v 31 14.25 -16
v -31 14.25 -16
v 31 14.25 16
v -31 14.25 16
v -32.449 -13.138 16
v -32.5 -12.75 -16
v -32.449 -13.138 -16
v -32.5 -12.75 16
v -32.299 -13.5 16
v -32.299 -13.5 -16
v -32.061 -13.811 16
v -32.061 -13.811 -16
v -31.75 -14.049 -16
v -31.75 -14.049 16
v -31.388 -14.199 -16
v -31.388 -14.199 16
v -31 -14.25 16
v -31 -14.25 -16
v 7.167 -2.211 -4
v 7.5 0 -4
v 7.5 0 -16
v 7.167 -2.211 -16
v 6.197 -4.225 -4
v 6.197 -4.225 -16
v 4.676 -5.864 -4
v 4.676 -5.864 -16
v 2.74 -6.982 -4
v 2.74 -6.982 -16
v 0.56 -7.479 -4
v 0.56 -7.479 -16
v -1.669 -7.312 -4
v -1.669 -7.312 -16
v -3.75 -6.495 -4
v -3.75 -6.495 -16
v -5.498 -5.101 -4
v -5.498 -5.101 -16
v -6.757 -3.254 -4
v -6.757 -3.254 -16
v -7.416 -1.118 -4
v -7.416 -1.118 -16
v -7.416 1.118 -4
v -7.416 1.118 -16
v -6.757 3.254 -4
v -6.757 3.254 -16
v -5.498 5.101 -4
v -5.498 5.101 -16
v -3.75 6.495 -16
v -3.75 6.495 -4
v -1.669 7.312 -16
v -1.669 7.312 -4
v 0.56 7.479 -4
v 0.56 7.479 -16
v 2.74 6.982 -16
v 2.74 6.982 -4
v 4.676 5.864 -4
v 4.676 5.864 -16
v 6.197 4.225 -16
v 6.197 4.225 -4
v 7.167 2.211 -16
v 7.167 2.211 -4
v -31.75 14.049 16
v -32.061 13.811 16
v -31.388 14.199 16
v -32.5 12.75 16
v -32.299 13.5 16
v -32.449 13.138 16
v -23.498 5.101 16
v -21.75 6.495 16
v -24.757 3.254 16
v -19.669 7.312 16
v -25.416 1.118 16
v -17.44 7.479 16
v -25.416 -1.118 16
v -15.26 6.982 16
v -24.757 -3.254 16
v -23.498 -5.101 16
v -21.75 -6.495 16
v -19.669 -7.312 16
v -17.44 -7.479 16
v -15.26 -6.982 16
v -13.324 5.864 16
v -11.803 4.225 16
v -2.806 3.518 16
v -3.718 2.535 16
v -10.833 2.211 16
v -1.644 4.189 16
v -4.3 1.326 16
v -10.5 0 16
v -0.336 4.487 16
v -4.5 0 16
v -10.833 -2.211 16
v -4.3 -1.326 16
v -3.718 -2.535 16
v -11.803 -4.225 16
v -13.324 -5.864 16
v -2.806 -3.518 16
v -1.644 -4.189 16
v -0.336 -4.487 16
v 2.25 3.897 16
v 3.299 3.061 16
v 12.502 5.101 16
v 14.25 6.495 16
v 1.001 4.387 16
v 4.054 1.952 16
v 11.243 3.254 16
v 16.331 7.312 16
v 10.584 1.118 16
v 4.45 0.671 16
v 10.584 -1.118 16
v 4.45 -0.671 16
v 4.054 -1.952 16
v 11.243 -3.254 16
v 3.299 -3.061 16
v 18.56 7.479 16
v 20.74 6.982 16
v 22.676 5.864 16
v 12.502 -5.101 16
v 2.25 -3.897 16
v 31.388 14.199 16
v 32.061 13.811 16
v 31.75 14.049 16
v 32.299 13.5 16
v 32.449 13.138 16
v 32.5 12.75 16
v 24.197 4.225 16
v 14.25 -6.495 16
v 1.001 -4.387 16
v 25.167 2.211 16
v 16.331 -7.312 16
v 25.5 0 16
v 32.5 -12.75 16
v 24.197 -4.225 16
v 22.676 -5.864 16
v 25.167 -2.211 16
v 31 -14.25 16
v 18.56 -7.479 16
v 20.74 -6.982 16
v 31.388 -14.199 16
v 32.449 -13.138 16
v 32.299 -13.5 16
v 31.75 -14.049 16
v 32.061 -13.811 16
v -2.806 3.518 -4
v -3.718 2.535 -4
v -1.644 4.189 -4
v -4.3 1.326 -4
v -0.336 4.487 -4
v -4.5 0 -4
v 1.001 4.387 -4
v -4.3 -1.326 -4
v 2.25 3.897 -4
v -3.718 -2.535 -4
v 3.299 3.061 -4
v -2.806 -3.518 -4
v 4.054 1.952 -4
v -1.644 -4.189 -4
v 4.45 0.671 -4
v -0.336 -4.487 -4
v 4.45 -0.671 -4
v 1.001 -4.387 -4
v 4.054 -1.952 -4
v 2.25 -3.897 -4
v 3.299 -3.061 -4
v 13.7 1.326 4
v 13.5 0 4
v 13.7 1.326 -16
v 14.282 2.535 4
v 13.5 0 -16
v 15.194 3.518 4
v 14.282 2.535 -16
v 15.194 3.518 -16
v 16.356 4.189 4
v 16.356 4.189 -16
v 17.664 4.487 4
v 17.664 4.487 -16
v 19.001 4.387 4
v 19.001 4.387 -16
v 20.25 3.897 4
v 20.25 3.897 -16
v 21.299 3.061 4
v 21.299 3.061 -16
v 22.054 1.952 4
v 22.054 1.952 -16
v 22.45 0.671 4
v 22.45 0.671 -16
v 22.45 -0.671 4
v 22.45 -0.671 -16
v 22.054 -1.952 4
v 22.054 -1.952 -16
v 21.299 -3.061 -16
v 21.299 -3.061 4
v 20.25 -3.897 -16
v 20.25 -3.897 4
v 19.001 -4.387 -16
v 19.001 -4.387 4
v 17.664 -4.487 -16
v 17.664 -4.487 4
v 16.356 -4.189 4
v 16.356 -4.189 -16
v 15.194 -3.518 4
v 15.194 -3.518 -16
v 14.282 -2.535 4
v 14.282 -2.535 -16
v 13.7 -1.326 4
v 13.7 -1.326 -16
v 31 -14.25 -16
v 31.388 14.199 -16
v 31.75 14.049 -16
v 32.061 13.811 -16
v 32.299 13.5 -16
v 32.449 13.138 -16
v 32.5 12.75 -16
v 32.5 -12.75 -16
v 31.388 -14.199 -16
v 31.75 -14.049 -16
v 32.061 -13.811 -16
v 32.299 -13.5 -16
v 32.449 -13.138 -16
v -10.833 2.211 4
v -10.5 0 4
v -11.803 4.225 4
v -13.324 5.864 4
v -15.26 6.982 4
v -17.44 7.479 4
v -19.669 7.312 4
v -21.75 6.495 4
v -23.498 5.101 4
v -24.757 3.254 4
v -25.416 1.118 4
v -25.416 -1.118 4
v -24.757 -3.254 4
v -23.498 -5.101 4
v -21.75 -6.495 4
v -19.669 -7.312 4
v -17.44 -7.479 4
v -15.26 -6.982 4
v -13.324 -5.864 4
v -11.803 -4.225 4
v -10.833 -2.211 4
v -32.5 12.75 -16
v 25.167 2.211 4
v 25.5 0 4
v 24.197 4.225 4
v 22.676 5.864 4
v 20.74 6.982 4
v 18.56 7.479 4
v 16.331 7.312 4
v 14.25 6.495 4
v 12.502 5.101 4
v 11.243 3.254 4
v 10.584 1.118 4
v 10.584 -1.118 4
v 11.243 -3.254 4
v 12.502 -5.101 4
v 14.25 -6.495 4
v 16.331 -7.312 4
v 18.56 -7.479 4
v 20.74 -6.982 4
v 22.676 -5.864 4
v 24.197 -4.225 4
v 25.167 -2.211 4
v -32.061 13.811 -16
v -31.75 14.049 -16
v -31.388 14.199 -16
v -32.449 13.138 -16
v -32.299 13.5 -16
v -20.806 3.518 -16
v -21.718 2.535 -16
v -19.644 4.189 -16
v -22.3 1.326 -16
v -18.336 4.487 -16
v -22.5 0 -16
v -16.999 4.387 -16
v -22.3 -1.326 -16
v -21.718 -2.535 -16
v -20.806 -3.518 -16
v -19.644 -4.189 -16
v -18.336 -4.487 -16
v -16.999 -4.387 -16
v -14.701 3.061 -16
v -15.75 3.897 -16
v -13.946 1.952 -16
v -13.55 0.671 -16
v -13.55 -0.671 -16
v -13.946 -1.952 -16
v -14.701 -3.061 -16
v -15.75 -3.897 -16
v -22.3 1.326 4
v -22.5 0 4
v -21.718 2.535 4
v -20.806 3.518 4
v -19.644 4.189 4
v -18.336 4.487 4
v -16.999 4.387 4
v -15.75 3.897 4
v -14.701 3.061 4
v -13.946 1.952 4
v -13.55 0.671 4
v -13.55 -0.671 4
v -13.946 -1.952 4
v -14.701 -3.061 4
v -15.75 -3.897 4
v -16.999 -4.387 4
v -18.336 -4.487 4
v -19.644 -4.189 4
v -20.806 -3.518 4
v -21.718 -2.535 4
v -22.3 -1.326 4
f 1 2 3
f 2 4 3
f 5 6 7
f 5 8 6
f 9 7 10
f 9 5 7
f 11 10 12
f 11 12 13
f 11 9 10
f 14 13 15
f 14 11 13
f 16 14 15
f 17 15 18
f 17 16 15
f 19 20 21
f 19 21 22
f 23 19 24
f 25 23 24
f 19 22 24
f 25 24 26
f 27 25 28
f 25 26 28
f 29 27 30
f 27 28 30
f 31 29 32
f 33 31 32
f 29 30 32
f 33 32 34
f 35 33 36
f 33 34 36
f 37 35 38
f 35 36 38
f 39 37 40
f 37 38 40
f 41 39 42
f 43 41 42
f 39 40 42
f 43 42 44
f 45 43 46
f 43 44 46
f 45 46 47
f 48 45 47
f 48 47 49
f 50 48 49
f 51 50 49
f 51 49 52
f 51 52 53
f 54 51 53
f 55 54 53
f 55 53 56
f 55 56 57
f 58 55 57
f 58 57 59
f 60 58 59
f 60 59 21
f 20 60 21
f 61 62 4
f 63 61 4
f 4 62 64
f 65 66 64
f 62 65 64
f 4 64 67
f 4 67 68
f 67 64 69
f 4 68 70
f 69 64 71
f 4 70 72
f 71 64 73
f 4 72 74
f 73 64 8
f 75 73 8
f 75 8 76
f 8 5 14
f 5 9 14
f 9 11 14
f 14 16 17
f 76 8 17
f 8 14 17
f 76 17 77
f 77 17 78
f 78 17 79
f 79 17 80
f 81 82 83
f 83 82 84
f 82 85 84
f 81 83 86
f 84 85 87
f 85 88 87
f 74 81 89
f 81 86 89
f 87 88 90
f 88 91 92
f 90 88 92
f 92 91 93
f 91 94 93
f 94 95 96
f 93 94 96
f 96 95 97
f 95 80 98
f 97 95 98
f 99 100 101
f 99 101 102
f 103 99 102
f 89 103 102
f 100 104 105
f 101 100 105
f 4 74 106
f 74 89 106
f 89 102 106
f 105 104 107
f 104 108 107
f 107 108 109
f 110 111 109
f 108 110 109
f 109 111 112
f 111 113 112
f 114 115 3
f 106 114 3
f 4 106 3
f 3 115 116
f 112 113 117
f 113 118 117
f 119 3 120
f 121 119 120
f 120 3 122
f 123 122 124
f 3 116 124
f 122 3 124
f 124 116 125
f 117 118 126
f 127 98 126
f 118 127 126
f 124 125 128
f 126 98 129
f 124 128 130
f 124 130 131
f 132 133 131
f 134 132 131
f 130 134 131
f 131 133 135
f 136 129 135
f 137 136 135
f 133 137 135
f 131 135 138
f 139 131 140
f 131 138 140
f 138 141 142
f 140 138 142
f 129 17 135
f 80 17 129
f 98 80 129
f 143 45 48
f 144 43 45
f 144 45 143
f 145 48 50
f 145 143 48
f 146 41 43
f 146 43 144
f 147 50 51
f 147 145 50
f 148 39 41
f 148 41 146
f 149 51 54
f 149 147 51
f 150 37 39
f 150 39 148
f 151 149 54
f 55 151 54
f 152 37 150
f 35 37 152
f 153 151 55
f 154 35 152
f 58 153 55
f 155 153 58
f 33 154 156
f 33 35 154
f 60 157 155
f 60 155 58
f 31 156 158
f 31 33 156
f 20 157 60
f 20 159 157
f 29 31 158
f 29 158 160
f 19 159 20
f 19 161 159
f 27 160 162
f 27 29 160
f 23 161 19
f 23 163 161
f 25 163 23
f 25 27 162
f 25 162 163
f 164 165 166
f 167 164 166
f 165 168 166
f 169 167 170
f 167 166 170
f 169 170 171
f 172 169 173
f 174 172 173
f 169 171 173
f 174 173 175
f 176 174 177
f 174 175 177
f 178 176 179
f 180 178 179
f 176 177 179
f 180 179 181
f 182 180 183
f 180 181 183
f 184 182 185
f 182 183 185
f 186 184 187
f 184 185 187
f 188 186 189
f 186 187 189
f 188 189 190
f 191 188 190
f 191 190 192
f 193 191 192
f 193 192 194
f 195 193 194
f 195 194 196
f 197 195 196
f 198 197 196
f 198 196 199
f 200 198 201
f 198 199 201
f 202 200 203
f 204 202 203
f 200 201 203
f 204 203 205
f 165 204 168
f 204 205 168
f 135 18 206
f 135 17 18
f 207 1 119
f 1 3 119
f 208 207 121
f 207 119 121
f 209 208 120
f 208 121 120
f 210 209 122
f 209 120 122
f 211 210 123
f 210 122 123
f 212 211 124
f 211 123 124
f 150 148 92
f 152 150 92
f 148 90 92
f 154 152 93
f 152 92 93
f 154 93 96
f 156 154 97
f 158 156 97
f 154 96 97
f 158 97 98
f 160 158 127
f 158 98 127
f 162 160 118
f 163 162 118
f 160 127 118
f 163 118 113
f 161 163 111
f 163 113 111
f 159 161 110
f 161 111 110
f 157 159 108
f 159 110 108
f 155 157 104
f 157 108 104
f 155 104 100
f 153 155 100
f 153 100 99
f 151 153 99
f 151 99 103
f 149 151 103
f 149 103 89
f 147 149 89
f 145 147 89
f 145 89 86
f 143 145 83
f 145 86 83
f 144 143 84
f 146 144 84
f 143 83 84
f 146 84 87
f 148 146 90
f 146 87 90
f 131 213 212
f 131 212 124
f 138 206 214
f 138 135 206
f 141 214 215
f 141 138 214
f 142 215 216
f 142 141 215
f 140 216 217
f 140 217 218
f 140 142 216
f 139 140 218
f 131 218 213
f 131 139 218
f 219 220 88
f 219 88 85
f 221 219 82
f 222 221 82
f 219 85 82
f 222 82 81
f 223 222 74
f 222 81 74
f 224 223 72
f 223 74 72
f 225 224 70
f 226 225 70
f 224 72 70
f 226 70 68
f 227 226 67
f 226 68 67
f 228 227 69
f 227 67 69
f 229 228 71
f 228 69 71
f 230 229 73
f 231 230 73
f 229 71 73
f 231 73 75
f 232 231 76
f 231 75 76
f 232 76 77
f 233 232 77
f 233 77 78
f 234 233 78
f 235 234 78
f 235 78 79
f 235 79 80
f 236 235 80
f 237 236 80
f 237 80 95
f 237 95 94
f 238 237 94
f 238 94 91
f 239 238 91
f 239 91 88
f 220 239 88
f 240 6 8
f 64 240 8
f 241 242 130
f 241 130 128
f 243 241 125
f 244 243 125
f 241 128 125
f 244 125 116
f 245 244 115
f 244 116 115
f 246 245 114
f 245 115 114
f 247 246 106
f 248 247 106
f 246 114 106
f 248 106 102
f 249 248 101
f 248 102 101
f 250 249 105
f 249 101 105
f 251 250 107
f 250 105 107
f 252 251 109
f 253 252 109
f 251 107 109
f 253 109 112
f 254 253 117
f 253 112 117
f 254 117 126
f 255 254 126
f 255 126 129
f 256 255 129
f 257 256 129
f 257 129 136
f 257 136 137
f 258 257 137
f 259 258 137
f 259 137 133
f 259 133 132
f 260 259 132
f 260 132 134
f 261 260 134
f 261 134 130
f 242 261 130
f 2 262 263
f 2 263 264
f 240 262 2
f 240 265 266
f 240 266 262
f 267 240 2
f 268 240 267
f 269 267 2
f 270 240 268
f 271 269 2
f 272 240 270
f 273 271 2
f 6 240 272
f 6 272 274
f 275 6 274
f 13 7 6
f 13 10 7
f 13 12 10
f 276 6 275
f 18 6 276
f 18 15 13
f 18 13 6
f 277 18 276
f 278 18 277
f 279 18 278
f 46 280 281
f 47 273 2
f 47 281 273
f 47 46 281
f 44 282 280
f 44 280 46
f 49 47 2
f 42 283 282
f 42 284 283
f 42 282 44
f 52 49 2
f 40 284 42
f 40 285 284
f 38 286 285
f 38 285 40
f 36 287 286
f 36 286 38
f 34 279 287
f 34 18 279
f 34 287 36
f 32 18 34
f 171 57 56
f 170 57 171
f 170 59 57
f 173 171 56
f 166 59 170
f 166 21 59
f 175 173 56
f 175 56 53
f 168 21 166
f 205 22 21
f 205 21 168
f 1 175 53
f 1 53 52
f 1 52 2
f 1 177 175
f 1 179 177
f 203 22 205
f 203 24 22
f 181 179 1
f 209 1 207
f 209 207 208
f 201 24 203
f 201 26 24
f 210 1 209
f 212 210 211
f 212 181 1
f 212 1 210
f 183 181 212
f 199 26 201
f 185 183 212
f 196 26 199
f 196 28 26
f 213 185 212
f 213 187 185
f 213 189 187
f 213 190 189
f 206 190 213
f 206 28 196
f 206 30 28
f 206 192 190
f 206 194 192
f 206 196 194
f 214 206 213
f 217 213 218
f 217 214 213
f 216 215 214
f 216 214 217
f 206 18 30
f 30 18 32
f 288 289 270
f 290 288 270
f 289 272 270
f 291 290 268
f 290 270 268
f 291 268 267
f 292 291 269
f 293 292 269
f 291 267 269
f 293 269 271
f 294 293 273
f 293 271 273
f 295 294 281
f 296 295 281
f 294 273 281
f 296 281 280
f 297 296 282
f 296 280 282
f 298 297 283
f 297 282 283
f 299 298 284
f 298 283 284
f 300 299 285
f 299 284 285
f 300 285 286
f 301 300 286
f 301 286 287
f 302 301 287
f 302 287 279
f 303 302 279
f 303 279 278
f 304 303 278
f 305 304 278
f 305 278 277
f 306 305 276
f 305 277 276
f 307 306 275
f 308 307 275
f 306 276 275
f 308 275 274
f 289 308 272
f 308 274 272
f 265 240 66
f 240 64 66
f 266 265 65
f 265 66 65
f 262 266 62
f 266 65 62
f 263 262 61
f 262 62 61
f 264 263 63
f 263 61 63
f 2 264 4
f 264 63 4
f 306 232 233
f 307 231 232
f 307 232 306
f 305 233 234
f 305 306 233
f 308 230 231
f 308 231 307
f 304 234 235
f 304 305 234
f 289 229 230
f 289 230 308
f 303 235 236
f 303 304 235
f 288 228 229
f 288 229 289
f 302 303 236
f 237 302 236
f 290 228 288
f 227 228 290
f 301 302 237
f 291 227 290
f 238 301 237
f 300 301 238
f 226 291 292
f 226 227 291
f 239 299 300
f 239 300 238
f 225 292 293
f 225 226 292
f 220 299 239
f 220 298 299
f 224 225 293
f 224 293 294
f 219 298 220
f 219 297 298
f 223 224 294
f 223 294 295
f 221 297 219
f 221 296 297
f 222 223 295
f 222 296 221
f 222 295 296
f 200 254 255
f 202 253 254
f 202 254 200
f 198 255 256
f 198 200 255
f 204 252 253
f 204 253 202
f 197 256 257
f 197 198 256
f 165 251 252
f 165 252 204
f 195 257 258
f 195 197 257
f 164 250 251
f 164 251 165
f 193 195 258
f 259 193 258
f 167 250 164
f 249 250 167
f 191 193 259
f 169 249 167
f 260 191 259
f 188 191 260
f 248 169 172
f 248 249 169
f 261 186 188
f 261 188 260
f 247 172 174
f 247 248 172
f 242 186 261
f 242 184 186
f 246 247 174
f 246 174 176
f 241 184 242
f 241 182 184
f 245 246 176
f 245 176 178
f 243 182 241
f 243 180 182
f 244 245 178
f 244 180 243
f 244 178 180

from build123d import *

# Parameters (mm, degrees)
F0_W                 = 65
F0_H                 = 32
F1_DEPTH             = 14.25
F4_D                 = 9
F4_DEPTH             = 40
F4_CBORE_D           = 15
F4_CBORE_DEPTH       = 12
F4_TIP               = 2.7038727856
F4_ON_F3_D           = 9
F4_ON_F3_DEPTH       = 40
F4_ON_F3_CBORE_D     = 15
F4_ON_F3_CBORE_DEPTH = 12
F4_ON_F3_TIP         = 2.7038727856
F5_R                 = 1.5


with BuildPart() as f1:
    # F0 (on Front) → F1 (new body, symmetric)
    with BuildSketch(Plane.XZ):
        Rectangle(F0_W, F0_H)
    extrude(amount=F1_DEPTH, both=True)

    # F4
    with Locations(Plane.XY.offset(16)):
        with Locations((-18, 0), (18, 0)):
            CounterBoreHole(F4_D / 2, F4_CBORE_D / 2, F4_CBORE_DEPTH, depth=F4_DEPTH)
            with Locations((0, 0, -(F4_DEPTH + F4_TIP / 2))):  # 118° drill point
                Cone(0, F4_D / 2, F4_TIP, mode=Mode.SUBTRACT)

    # F4 on F3
    with Locations(Plane(origin=(0, 0, -16), x_dir=(1, 0, 0), z_dir=(0, 0, -1))):
        with Locations((0, 0)):
            CounterBoreHole(F4_ON_F3_D / 2, F4_ON_F3_CBORE_D / 2, F4_ON_F3_CBORE_DEPTH, depth=F4_ON_F3_DEPTH)
            with Locations((0, 0, -(F4_ON_F3_DEPTH + F4_ON_F3_TIP / 2))):  # 118° drill point
                Cone(0, F4_ON_F3_D / 2, F4_ON_F3_TIP, mode=Mode.SUBTRACT)

    # F5
    f5_edges = [f1.edges().sort_by_distance(p)[0] for p in [
        (-32.5, -14.25, 0),
        (32.5, -14.25, 0),
        (32.5, 14.25, 0),
        (-32.5, 14.25, 0),
    ]]
    fillet(f5_edges, radius=F5_R)


solid = f1.part
